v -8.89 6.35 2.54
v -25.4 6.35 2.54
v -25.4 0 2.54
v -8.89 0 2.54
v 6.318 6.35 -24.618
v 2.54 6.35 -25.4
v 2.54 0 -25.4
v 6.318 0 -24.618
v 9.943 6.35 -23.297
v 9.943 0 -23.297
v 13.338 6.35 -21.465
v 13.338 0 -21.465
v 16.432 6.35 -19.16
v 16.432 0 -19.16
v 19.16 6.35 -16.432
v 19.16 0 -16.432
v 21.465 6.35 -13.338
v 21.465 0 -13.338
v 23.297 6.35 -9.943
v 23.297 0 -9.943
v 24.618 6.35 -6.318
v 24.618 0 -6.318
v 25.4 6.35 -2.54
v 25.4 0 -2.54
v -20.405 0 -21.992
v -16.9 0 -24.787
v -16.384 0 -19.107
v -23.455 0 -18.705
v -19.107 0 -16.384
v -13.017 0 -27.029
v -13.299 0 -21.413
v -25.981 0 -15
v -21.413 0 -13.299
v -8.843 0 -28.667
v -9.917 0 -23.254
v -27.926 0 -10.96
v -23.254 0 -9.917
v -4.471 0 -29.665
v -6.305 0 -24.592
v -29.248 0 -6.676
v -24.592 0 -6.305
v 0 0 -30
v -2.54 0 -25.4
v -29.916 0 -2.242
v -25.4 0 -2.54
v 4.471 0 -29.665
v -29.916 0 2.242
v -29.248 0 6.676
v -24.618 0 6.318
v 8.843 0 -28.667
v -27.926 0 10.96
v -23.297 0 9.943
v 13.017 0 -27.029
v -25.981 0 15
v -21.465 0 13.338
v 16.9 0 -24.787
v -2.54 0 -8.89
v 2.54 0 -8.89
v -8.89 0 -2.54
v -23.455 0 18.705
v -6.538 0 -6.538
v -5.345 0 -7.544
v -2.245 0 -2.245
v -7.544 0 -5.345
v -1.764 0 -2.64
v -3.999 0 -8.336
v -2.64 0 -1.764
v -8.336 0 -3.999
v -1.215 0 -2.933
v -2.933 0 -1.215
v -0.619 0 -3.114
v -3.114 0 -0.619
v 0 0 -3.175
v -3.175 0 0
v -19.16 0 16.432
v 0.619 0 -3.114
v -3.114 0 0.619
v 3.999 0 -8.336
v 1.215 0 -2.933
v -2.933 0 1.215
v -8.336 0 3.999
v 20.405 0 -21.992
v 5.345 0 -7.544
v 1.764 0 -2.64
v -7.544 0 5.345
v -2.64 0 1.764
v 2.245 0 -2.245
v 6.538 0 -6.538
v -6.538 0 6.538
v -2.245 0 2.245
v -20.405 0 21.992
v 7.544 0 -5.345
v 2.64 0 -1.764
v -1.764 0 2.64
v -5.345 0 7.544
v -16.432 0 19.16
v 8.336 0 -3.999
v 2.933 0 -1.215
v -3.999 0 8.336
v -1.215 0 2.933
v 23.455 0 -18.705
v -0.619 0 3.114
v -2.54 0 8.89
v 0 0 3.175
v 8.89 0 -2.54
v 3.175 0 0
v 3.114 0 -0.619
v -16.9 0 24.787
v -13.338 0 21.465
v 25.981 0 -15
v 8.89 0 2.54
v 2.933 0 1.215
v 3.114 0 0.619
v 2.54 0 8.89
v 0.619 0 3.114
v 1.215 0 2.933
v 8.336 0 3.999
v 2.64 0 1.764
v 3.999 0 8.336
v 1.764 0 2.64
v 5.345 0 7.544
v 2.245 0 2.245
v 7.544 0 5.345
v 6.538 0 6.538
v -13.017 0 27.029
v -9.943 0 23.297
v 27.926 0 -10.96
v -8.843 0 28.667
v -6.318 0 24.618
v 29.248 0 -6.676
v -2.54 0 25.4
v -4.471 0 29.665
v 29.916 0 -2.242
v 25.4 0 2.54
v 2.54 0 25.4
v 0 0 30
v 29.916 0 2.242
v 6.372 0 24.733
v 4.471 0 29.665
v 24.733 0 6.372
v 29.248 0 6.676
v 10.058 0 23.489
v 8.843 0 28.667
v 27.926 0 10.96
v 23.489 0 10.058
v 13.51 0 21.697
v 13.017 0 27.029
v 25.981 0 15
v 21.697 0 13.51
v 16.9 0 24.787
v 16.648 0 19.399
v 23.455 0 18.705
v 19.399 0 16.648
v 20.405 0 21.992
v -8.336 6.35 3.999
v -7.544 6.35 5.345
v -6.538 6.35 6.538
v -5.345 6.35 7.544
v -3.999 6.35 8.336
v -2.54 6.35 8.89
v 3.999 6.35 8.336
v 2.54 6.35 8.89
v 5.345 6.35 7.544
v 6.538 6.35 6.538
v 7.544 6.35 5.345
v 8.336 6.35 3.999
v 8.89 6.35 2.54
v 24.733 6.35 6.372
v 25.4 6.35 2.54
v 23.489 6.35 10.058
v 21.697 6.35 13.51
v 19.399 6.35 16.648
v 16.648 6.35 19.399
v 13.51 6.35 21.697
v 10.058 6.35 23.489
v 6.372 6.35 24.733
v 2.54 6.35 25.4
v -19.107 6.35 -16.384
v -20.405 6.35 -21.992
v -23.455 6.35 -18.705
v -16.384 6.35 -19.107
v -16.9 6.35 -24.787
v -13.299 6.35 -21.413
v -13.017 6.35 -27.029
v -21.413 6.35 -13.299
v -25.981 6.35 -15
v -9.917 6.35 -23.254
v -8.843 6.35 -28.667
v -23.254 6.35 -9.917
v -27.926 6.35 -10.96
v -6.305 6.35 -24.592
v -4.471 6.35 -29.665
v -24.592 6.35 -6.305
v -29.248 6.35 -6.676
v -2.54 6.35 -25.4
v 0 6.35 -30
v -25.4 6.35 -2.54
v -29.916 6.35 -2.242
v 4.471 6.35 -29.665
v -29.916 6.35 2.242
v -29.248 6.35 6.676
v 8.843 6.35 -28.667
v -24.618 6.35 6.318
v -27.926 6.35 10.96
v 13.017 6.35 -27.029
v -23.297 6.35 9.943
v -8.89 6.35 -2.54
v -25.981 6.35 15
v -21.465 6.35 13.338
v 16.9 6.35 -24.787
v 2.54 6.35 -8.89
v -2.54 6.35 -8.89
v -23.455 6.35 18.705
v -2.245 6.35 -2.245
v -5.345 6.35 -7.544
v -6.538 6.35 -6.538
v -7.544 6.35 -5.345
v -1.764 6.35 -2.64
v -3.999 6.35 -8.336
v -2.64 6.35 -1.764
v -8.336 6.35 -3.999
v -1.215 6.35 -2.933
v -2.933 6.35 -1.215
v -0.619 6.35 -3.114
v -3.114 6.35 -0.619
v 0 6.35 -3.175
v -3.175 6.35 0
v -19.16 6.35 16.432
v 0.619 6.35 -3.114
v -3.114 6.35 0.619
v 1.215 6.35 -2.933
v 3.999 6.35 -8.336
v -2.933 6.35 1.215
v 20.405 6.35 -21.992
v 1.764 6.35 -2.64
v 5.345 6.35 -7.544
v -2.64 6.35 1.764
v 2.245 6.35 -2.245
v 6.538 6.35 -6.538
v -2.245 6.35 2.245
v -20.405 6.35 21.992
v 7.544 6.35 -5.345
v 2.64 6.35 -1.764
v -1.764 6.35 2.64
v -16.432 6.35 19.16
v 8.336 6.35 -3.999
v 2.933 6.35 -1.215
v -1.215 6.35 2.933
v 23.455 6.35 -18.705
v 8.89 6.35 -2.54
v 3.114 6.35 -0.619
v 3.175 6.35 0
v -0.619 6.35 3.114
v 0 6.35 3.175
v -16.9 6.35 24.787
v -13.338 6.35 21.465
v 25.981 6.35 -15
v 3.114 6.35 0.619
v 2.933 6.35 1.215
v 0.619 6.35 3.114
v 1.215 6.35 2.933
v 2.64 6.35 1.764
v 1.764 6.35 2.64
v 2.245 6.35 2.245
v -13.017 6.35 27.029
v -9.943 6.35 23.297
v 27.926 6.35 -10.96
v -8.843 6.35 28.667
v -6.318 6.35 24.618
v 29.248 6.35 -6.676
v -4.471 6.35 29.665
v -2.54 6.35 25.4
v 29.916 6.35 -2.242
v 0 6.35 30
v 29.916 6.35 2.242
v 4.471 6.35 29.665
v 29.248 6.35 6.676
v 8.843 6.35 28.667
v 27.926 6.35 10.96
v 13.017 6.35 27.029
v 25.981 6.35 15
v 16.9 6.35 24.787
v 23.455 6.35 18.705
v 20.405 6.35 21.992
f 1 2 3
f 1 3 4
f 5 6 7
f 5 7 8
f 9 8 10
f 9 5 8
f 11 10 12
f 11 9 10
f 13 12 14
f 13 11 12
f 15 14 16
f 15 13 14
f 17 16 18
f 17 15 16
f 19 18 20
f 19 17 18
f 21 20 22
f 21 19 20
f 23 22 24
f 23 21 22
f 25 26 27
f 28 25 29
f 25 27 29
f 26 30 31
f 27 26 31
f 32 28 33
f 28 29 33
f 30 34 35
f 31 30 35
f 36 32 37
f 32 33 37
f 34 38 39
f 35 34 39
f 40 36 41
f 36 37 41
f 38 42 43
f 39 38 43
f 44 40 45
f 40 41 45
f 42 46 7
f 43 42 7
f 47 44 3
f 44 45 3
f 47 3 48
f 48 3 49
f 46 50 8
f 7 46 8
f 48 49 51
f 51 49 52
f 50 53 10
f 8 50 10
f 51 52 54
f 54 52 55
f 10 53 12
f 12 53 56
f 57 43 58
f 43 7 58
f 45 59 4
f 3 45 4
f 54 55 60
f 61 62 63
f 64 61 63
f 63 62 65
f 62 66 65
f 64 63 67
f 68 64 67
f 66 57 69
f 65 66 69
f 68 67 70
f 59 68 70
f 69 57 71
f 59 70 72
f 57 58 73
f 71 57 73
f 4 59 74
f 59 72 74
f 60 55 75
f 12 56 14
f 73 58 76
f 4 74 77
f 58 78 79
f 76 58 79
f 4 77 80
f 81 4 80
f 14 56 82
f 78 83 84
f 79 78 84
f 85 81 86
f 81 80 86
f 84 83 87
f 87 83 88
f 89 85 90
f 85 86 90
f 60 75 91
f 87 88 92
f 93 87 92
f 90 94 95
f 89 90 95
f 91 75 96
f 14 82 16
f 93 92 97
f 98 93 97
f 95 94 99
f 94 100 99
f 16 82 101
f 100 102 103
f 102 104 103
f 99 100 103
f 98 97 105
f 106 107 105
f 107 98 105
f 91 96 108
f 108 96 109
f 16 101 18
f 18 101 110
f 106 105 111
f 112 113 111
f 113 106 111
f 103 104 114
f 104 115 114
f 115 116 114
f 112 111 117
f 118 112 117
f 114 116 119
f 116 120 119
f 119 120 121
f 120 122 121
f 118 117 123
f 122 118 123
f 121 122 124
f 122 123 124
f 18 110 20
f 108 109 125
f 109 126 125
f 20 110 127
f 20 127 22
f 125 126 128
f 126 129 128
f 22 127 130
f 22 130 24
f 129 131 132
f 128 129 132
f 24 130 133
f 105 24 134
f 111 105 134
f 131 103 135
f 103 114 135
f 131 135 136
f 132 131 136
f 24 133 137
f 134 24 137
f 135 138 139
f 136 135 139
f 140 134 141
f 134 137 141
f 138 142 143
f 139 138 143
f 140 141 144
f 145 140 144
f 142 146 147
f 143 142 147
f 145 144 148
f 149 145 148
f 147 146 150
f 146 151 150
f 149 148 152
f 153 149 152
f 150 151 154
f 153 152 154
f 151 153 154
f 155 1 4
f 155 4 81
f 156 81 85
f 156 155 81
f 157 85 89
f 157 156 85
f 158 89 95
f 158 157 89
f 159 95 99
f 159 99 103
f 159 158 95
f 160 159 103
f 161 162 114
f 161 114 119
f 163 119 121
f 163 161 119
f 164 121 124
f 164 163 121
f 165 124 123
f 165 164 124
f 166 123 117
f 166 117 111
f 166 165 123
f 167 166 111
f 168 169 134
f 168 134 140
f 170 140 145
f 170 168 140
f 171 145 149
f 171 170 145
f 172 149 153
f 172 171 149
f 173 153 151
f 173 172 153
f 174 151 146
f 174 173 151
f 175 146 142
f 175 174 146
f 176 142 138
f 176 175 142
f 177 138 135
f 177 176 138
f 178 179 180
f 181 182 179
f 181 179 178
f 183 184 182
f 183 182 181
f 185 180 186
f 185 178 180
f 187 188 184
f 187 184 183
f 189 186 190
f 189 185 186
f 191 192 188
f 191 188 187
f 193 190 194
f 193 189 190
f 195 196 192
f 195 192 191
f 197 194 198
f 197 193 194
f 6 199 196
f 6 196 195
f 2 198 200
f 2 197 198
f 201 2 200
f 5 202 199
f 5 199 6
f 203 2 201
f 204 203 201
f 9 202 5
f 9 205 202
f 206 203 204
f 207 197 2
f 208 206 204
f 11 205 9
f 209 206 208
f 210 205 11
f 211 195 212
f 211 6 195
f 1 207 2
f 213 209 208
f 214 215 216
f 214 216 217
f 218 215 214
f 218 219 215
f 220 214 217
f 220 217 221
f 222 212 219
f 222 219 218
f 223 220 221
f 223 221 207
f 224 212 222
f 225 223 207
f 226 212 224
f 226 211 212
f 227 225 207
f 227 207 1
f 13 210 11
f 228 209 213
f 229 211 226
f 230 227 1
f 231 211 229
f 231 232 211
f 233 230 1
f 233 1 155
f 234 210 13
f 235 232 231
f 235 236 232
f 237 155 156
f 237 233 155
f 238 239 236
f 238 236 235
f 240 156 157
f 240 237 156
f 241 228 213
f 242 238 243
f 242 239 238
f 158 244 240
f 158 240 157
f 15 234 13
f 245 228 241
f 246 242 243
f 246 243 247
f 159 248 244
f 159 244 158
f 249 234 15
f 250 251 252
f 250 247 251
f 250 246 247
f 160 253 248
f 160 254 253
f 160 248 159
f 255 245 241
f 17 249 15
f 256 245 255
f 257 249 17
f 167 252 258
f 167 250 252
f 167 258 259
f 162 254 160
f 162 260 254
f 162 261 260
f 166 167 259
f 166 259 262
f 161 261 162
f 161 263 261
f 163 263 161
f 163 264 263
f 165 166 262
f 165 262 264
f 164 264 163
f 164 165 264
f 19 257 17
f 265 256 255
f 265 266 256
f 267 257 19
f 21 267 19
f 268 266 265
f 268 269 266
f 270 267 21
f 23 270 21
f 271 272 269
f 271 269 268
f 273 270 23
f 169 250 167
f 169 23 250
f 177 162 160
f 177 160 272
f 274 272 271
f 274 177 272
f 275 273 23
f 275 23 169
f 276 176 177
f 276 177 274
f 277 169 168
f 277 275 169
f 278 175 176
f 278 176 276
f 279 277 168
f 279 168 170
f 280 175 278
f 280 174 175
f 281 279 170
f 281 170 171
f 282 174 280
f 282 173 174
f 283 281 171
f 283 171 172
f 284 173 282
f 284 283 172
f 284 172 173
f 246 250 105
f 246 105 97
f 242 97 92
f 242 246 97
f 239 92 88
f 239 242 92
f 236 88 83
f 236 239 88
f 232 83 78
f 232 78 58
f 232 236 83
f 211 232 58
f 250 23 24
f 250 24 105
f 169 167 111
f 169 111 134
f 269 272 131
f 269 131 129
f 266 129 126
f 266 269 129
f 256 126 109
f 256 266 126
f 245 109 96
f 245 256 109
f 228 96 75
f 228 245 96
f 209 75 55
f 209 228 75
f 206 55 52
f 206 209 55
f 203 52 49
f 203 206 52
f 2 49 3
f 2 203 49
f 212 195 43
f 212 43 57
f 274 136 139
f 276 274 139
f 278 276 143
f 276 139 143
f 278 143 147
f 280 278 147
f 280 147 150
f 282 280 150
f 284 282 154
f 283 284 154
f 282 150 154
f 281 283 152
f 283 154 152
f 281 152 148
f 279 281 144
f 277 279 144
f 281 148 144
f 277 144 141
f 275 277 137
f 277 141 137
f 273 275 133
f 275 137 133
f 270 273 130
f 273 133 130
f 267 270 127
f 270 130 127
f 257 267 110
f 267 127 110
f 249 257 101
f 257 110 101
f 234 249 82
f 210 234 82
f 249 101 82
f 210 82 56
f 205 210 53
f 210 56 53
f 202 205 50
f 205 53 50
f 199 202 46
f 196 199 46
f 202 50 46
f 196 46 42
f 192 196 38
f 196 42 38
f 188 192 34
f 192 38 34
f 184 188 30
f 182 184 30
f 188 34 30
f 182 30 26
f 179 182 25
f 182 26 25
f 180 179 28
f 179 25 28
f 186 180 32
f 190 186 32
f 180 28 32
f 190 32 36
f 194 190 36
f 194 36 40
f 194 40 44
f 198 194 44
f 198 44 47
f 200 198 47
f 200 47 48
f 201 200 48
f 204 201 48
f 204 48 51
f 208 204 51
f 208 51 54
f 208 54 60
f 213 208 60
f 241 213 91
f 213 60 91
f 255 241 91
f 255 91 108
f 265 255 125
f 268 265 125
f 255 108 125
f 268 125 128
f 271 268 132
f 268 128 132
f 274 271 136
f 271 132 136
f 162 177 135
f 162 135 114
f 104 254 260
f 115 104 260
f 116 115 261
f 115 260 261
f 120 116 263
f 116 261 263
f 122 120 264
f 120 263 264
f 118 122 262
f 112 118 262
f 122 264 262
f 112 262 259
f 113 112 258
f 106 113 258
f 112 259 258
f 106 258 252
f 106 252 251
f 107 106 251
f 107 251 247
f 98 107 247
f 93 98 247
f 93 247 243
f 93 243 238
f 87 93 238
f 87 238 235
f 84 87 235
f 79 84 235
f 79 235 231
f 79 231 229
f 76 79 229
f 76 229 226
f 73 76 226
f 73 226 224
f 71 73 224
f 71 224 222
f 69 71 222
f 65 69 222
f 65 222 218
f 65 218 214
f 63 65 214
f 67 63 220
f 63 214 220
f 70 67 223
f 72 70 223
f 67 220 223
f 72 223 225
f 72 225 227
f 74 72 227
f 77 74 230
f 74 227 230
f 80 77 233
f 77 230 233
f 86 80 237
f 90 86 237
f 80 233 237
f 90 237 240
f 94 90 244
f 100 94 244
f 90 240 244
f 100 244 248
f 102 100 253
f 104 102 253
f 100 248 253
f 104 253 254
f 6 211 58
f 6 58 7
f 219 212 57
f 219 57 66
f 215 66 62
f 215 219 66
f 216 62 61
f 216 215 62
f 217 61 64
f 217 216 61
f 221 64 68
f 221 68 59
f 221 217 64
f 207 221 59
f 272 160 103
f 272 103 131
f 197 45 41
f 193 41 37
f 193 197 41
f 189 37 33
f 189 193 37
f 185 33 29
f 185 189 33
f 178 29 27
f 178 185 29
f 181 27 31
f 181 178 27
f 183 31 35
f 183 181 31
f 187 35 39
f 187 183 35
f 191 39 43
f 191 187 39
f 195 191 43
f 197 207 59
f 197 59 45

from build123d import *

# Parameters (mm, degrees)
SKETCH1_R           = 30
BOSS_EXTRUDE1_DEPTH = 6.35
SKETCH2_R           = 3.175
CUT_EXTRUDE1_DEPTH  = 43.898980174
CUT_EXTRUDE2_DEPTH  = 43.898980174


with BuildPart() as part:
    # Sketch1 → Boss-Extrude1 (new body)
    with BuildSketch(Plane(origin=(0, 0, 0), x_dir=(1, 0, 0), z_dir=(0, 1, 0))):
        with Locations(Location((0, 0, 0), (0, 0, 270))):
            Circle(SKETCH1_R)
    extrude(amount=BOSS_EXTRUDE1_DEPTH)

    # Sketch2 → Cut-Extrude1 (cut, through all)
    with BuildSketch(Plane(origin=(0, 6.35, 0), x_dir=(1, 0, 0), z_dir=(0, 1, 0))):
        with Locations(Location((0, 0, 0), (0, 0, 270))):
            Circle(SKETCH2_R)
    extrude(amount=-CUT_EXTRUDE1_DEPTH, mode=Mode.SUBTRACT)

    # Sketch3 → Cut-Extrude2 (cut, through all)
    with BuildSketch(Plane(origin=(0, 6.35, 0), x_dir=(1, 0, 0), z_dir=(0, 1, 0))):
        with BuildLine():
            Line((8.89, -2.54), (25.4, -2.54))
            ThreePointArc((25.4, -2.54), (18.076447857, -18.076447857), (2.54, -25.4))
            Line((2.54, -25.4), (2.54, -8.89))
            ThreePointArc((2.54, -8.89), (6.53772514, -6.53772514), (8.89, -2.54))
        make_face()
        with BuildLine():
            Line((-2.54, -8.89), (-2.54, -25.4))
            ThreePointArc((-2.54, -25.4), (-17.845937126, -17.845937126), (-25.4, -2.54))
            Line((-25.4, -2.54), (-8.89, -2.54))
            ThreePointArc((-8.89, -2.54), (-6.53772514, -6.53772514), (-2.54, -8.89))
        make_face()
        with BuildLine():
            Line((-8.89, 2.54), (-25.4, 2.54))
            ThreePointArc((-25.4, 2.54), (-17.794170178, 17.794170178), (-2.54, 25.4))
            Line((-2.54, 25.4), (-2.54, 8.89))
            ThreePointArc((-2.54, 8.89), (-6.53772514, 6.53772514), (-8.89, 2.54))
        make_face()
        with BuildLine():
            Line((2.54, 8.89), (2.54, 25.4))
            ThreePointArc((2.54, 25.4), (17.845937126, 17.845937126), (25.4, 2.54))
            Line((25.4, 2.54), (8.89, 2.54))
            ThreePointArc((8.89, 2.54), (6.53772514, 6.53772514), (2.54, 8.89))
        make_face()
    extrude(amount=-CUT_EXTRUDE2_DEPTH, mode=Mode.SUBTRACT)


solid = part.part
